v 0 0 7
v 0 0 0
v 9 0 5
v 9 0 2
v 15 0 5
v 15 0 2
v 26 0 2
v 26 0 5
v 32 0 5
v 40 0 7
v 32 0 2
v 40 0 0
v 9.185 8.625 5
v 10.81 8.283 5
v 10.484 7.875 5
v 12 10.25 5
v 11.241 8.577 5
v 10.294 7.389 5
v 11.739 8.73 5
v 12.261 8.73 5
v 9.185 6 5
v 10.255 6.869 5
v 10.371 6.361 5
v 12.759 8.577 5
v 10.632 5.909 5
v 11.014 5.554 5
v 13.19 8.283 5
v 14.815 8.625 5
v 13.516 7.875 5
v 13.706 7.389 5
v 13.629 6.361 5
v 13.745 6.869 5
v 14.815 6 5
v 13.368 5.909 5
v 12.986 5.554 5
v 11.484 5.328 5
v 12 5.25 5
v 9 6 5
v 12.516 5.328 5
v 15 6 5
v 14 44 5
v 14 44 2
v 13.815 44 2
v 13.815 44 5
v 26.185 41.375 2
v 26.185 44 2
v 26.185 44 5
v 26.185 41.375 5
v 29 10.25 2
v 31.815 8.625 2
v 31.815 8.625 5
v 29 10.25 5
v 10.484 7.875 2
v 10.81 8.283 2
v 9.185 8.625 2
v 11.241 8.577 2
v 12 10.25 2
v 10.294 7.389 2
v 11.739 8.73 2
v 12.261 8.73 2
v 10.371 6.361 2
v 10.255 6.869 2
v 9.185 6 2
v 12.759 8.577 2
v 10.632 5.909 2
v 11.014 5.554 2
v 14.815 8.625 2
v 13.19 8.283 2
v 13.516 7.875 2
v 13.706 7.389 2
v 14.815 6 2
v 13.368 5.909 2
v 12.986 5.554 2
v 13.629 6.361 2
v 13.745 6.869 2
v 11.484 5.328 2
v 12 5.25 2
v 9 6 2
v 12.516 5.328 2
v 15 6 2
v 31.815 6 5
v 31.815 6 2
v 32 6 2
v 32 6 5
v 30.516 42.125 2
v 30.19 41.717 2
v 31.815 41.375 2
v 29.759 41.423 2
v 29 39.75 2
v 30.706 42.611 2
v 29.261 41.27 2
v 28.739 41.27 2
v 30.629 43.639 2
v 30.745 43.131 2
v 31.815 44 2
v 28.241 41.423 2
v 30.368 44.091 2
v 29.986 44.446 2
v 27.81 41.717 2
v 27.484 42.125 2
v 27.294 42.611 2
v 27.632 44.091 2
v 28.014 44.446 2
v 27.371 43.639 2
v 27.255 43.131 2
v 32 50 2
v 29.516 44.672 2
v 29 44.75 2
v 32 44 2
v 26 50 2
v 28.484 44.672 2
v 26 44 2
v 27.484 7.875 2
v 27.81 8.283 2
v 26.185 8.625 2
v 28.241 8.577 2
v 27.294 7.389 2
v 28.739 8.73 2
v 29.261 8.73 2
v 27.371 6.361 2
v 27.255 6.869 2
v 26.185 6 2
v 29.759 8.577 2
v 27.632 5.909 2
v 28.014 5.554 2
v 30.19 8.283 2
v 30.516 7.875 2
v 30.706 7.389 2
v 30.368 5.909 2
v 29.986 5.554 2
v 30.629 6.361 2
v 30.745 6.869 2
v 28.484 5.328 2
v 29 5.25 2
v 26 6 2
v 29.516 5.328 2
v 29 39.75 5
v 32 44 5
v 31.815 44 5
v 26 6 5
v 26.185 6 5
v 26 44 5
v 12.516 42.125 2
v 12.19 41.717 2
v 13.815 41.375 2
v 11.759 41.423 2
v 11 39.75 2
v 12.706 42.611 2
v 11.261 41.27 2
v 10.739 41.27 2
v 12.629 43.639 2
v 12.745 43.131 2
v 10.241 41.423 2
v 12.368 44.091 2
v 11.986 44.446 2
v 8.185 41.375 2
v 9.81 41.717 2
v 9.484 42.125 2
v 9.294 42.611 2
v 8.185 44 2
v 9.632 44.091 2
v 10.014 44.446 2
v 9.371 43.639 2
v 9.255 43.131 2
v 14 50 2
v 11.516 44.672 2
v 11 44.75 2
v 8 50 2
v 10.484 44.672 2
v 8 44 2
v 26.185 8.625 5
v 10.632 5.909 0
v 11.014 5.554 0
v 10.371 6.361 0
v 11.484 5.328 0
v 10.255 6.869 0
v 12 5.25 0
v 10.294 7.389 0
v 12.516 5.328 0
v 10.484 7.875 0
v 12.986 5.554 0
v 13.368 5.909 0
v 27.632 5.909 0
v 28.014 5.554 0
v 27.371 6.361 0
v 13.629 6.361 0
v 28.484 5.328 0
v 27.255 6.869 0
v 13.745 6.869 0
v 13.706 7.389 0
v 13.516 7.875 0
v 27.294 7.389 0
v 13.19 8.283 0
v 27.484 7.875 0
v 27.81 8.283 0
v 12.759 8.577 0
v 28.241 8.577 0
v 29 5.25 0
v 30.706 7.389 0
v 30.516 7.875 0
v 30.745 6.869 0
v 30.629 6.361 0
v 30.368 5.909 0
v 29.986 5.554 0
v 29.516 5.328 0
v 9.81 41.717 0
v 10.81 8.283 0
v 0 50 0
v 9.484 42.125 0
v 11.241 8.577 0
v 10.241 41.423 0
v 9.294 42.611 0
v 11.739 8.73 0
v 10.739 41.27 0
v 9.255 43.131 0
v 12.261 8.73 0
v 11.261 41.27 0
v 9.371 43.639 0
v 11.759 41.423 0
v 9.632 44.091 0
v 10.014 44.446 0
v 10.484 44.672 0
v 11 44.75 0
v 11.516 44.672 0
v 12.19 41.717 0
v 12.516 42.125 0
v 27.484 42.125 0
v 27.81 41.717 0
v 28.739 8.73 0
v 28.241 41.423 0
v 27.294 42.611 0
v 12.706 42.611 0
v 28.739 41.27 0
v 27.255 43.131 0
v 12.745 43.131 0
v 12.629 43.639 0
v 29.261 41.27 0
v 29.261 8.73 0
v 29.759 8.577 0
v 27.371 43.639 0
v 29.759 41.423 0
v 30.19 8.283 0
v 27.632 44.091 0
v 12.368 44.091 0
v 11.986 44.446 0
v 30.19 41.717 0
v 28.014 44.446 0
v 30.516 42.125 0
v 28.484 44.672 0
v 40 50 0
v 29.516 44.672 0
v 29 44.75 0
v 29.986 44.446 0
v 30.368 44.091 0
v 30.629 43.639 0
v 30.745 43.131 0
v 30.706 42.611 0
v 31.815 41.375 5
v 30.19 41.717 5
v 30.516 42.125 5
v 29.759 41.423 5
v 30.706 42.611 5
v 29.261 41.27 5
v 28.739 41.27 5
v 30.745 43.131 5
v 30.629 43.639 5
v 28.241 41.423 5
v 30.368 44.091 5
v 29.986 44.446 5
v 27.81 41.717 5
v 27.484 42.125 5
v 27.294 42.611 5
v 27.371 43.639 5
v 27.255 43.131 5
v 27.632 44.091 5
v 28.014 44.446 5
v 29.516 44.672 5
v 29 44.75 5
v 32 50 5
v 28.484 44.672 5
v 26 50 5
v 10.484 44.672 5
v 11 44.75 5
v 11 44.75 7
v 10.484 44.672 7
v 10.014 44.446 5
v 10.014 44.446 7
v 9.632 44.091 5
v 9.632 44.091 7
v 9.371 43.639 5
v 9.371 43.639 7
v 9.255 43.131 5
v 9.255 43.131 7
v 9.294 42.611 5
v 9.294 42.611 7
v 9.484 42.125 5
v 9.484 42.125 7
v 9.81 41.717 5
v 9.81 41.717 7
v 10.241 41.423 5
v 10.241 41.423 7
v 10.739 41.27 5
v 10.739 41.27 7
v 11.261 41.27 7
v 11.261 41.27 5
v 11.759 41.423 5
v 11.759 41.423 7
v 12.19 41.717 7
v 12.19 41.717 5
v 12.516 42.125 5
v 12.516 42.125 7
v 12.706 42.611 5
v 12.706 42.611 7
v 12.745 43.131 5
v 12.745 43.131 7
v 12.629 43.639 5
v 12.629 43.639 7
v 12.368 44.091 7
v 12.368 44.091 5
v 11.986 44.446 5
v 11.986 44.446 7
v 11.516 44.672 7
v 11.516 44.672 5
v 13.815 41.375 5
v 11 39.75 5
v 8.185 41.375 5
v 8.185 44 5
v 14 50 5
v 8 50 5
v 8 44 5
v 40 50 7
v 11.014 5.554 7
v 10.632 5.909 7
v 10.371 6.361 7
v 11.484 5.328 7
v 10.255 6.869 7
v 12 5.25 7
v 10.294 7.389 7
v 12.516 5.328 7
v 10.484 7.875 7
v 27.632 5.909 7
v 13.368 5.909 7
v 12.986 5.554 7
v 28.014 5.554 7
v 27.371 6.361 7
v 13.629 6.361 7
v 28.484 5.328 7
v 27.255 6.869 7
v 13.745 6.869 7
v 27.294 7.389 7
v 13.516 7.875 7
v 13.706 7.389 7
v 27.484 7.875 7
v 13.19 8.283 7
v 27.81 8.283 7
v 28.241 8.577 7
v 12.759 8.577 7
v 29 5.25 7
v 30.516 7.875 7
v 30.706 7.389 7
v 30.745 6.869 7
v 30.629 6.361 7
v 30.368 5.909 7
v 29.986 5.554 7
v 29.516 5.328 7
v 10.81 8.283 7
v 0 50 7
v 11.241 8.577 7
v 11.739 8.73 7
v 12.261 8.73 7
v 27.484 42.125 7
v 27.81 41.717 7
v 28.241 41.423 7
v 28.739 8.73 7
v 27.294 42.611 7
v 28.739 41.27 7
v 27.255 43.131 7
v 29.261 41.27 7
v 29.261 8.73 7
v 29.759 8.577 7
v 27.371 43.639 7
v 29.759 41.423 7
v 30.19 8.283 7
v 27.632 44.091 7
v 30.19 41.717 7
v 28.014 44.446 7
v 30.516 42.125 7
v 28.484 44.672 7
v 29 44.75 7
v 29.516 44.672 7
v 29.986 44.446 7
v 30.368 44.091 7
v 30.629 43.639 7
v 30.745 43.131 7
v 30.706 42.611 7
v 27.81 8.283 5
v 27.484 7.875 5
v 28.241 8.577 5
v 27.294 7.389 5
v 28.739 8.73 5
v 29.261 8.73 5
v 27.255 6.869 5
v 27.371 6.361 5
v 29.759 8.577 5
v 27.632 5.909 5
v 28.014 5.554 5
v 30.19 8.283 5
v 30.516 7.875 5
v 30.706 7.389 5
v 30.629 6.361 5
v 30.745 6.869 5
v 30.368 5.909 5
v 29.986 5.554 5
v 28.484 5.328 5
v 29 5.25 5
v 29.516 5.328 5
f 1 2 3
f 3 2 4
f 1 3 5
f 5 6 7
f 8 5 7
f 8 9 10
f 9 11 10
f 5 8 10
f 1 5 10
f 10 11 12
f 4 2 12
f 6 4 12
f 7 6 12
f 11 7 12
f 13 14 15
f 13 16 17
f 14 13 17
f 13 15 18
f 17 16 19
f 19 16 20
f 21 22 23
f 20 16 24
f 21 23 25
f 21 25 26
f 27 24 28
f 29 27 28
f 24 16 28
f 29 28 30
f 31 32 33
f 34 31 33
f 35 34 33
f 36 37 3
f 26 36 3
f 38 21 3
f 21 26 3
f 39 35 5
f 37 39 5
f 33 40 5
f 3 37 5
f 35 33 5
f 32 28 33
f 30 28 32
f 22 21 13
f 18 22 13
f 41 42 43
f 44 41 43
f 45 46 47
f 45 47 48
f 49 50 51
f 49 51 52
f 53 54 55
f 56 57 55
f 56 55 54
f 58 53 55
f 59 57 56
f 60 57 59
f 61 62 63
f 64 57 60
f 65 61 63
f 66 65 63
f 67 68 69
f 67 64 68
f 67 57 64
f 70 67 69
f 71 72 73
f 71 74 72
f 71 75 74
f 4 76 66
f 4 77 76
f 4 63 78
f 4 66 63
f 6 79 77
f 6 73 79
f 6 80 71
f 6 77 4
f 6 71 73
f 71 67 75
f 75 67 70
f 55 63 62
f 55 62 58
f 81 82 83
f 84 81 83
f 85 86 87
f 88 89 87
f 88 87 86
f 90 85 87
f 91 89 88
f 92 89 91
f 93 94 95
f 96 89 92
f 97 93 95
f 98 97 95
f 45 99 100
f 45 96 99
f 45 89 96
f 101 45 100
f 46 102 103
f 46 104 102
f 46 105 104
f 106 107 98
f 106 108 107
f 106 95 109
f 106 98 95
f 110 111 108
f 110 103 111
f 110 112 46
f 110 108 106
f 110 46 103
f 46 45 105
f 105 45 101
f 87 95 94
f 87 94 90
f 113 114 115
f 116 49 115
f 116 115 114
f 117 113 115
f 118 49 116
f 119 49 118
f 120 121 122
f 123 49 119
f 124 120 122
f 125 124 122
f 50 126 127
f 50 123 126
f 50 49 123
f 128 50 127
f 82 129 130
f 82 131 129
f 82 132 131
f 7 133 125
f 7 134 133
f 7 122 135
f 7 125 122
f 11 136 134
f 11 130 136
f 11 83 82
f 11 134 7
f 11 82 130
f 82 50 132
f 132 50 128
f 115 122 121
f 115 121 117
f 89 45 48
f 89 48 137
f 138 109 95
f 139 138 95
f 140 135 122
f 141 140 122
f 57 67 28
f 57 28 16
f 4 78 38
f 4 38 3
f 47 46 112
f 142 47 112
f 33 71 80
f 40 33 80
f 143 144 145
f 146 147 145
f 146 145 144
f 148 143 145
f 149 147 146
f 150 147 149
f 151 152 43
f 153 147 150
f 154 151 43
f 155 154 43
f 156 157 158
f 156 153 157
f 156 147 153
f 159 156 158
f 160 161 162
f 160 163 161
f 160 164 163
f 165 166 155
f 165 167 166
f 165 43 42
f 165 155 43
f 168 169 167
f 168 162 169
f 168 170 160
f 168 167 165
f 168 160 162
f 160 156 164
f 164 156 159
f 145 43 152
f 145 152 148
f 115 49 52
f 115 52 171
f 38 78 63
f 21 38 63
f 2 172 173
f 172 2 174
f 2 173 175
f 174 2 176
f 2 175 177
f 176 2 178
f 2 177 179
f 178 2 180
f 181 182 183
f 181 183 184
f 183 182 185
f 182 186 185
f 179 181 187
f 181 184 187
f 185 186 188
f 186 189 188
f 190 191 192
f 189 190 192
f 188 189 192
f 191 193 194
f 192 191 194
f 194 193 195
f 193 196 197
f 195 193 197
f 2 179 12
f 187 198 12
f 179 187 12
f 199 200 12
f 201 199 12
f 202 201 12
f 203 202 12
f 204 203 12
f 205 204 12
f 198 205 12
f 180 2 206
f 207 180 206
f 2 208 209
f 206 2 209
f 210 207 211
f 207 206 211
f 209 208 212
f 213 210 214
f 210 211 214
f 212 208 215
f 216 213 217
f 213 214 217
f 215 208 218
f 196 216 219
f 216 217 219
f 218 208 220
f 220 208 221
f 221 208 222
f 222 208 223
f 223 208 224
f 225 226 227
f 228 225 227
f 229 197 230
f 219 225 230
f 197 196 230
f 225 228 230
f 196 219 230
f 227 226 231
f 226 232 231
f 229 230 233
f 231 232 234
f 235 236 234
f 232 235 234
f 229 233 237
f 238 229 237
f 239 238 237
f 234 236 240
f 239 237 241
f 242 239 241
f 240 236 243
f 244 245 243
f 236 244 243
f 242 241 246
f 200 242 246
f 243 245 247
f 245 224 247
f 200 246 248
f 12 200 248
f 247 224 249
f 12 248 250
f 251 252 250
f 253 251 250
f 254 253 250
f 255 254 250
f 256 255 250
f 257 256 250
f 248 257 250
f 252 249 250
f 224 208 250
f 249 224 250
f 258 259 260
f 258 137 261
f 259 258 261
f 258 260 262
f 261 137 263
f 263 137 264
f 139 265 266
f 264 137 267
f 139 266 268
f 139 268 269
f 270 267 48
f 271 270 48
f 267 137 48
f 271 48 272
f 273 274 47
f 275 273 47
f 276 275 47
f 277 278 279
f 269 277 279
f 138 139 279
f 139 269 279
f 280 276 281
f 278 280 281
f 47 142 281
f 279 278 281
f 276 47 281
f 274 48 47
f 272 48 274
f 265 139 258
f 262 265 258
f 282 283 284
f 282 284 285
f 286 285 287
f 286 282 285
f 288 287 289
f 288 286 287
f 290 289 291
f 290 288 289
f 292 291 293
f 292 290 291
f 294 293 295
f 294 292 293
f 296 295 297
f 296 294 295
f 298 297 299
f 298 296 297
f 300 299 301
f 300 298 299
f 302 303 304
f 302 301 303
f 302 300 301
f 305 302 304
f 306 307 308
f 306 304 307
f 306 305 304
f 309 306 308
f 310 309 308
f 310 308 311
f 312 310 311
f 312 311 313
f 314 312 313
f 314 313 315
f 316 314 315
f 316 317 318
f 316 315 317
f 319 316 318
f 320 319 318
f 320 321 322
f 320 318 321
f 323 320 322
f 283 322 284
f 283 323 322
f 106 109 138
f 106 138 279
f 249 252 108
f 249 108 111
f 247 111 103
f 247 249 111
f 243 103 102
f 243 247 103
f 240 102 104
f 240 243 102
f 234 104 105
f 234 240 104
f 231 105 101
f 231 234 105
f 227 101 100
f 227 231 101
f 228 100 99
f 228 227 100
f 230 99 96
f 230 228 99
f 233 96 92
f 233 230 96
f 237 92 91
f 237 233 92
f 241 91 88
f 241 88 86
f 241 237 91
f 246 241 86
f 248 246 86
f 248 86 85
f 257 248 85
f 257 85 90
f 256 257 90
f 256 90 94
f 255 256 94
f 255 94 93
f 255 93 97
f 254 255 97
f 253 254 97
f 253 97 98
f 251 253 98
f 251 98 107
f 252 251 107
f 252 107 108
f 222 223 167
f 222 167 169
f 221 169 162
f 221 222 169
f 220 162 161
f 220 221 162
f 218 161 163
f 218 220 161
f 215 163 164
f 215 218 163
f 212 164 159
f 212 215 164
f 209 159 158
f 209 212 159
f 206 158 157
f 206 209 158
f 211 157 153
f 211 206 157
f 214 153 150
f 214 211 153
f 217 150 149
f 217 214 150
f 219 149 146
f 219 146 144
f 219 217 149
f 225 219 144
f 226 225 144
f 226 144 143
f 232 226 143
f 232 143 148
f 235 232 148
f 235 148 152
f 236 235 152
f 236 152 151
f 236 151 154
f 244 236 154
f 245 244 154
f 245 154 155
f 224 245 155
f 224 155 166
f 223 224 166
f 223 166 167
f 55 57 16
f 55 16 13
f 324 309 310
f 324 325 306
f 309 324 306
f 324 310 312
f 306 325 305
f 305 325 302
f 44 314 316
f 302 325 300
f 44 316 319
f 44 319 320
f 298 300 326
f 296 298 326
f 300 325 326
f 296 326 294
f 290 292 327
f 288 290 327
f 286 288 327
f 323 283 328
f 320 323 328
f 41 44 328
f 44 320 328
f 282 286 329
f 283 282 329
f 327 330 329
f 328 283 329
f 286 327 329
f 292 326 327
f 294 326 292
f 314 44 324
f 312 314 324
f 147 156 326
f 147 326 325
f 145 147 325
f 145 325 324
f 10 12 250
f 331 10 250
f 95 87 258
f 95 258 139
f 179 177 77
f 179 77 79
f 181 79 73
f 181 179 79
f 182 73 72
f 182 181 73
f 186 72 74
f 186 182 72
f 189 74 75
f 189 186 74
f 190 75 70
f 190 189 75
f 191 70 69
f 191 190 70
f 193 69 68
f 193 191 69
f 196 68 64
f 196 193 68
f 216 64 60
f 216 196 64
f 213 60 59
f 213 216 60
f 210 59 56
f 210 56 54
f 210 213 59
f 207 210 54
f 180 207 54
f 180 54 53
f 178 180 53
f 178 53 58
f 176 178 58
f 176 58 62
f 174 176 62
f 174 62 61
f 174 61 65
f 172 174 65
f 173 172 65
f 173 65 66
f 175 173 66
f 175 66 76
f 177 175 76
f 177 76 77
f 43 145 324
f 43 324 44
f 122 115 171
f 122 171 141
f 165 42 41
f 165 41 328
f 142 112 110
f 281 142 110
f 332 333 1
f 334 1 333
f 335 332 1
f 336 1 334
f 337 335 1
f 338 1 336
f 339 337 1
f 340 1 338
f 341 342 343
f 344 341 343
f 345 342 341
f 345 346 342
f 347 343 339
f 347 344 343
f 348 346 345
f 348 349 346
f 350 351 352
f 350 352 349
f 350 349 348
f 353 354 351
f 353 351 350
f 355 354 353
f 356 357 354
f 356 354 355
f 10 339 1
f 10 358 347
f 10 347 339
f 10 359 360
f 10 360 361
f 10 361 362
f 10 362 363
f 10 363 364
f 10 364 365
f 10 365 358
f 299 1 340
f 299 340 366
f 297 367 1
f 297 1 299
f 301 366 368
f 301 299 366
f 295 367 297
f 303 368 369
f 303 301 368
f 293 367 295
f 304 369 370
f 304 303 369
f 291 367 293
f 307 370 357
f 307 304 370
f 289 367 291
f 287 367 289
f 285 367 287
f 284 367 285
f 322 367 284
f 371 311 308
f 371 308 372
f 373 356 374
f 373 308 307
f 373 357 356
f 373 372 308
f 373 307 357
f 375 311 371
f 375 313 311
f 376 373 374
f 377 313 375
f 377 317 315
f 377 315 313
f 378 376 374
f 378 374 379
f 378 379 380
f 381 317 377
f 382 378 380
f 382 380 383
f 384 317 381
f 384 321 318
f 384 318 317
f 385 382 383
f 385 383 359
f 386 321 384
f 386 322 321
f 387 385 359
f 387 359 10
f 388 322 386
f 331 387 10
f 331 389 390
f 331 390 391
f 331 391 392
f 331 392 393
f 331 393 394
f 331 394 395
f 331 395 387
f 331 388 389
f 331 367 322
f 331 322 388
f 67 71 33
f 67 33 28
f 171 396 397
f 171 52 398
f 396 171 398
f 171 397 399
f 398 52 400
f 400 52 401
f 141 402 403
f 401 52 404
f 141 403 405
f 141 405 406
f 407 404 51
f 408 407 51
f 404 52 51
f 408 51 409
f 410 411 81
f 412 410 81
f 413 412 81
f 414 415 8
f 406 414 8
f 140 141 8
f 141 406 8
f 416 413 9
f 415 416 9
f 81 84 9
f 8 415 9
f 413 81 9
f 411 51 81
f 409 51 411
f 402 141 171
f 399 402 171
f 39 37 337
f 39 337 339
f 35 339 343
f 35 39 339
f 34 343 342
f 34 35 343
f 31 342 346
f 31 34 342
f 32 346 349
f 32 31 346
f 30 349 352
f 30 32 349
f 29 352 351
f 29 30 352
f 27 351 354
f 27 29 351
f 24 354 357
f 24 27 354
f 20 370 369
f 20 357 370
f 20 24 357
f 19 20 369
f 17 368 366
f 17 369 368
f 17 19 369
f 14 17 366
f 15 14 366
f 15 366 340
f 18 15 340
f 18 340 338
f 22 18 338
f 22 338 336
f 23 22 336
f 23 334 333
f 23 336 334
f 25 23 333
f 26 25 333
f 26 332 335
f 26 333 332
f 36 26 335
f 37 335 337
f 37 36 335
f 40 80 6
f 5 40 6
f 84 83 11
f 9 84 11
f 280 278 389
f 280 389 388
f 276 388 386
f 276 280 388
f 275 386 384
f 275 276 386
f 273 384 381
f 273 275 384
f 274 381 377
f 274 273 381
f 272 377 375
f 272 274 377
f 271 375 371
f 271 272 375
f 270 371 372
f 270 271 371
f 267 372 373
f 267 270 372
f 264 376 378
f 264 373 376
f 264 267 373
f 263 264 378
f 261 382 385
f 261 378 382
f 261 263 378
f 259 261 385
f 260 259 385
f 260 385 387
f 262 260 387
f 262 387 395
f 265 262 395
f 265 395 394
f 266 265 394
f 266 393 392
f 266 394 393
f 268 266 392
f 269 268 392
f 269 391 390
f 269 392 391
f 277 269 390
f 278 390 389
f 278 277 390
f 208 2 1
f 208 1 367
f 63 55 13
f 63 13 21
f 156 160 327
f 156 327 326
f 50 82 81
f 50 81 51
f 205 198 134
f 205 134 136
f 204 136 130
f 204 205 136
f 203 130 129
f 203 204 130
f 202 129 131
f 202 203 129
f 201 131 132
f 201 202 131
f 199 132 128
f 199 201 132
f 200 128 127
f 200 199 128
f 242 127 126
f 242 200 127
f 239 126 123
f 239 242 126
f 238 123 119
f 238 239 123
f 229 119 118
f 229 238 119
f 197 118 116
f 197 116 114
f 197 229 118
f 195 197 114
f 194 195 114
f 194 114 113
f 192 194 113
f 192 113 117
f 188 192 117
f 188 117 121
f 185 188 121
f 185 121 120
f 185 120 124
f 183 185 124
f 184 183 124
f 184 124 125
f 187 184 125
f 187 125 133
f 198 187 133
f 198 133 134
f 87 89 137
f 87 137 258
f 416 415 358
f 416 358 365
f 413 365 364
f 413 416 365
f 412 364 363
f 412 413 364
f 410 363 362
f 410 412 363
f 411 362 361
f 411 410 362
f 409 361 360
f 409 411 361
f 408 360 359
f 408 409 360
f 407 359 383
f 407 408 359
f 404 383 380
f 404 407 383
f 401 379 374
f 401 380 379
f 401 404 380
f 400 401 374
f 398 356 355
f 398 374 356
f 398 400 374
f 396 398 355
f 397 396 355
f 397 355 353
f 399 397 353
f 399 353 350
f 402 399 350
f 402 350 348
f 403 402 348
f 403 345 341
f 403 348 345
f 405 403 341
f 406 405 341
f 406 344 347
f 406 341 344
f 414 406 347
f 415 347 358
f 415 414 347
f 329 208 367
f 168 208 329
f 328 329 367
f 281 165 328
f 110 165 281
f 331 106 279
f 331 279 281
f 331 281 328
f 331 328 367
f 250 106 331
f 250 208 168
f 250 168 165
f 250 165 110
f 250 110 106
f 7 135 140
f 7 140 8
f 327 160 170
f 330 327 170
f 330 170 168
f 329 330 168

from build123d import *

# Parameters (mm, degrees)
CYLINDER021_R             = 1.75
CYLINDER021_DEPTH         = 30
BOX023_W                  = 20
BOX023_H                  = 6
BOX023_DEPTH              = 3
PRISM021_DEPTH            = 3
FUSION018_PLACEMENT_ANGLE = 90
CYLINDER019_R             = 1.75
CYLINDER019_DEPTH         = 30
BOX020_W                  = 20
BOX020_H                  = 6
BOX020_DEPTH              = 3
PRISM019_DEPTH            = 3
FUSION019_PLACEMENT_ANGLE = 90
CYLINDER022_R             = 1.75
CYLINDER022_DEPTH         = 30
BOX021_W                  = 20
BOX021_H                  = 6
BOX021_DEPTH              = 3
PRISM022_DEPTH            = 3
FUSION020_PLACEMENT_ANGLE = 90
CYLINDER020_R             = 1.75
CYLINDER020_DEPTH         = 30
BOX022_W                  = 20
BOX022_H                  = 6
BOX022_DEPTH              = 3
PRISM020_DEPTH            = 3
FUSION017_PLACEMENT_ANGLE = 90
BOX019_W                  = 40
BOX019_H                  = 50
BOX019_DEPTH              = 7


with BuildPart() as cilindro021:
    # Cylinder021 → Cylinder021 (new body)
    with BuildSketch(Plane.XY.offset(-5)):
        Circle(CYLINDER021_R)
    extrude(amount=CYLINDER021_DEPTH)


with BuildPart() as cubo023:
    # Box023 → Box023 (new body)
    with BuildSketch(Plane(origin=(1, -3, 0), x_dir=(1, 0, 0), z_dir=(0, 0, 1))):
        with Locations((10, 3)):
            Rectangle(BOX023_W, BOX023_H)
    extrude(amount=BOX023_DEPTH)


with BuildPart() as fusion018:
    # Prism021 → Prism021 (new body)
    with BuildSketch(Plane.XY):
        Polygon((3.25, 0), (1.625, 2.814583), (-1.625, 2.814583), (-3.25, 0), (-1.625, -2.814583), (1.625, -2.814583), align=None)
    extrude(amount=PRISM021_DEPTH)

    # Fusion018: union Cilindro021, Cubo023
    add(cilindro021.part)
    add(cubo023.part)


with BuildPart() as fusion018_1:
    # Fusion018 placement: moved
    add(fusion018.part.moved(Location((29, 43, 2))).rotate(Axis((29, 43, 2), (0, 0, 1)), FUSION018_PLACEMENT_ANGLE))


with BuildPart() as cilindro019:
    # Cylinder019 → Cylinder019 (new body)
    with BuildSketch(Plane.XY.offset(-5)):
        Circle(CYLINDER019_R)
    extrude(amount=CYLINDER019_DEPTH)


with BuildPart() as cubo020:
    # Box020 → Box020 (new body)
    with BuildSketch(Plane(origin=(1, -3, 0), x_dir=(1, 0, 0), z_dir=(0, 0, 1))):
        with Locations((10, 3)):
            Rectangle(BOX020_W, BOX020_H)
    extrude(amount=BOX020_DEPTH)


with BuildPart() as fusion019:
    # Prism019 → Prism019 (new body)
    with BuildSketch(Plane.XY):
        Polygon((3.25, 0), (1.625, 2.814583), (-1.625, 2.814583), (-3.25, 0), (-1.625, -2.814583), (1.625, -2.814583), align=None)
    extrude(amount=PRISM019_DEPTH)

    # Fusion019: union Cilindro019, Cubo020
    add(cilindro019.part)
    add(cubo020.part)


with BuildPart() as fusion019_1:
    # Fusion019 placement: moved
    add(fusion019.part.moved(Location((29, 7, 2))).rotate(Axis((29, 7, 2), (0, 0, -1)), FUSION019_PLACEMENT_ANGLE))


with BuildPart() as cilindro022:
    # Cylinder022 → Cylinder022 (new body)
    with BuildSketch(Plane.XY.offset(-5)):
        Circle(CYLINDER022_R)
    extrude(amount=CYLINDER022_DEPTH)


with BuildPart() as cubo021:
    # Box021 → Box021 (new body)
    with BuildSketch(Plane(origin=(1, -3, 0), x_dir=(1, 0, 0), z_dir=(0, 0, 1))):
        with Locations((10, 3)):
            Rectangle(BOX021_W, BOX021_H)
    extrude(amount=BOX021_DEPTH)


with BuildPart() as fusion020:
    # Prism022 → Prism022 (new body)
    with BuildSketch(Plane.XY):
        Polygon((3.25, 0), (1.625, 2.814583), (-1.625, 2.814583), (-3.25, 0), (-1.625, -2.814583), (1.625, -2.814583), align=None)
    extrude(amount=PRISM022_DEPTH)

    # Fusion020: union Cilindro022, Cubo021
    add(cilindro022.part)
    add(cubo021.part)


with BuildPart() as fusion020_1:
    # Fusion020 placement: moved
    add(fusion020.part.moved(Location((12, 7, 2))).rotate(Axis((12, 7, 2), (0, 0, -1)), FUSION020_PLACEMENT_ANGLE))


with BuildPart() as cilindro020:
    # Cylinder020 → Cylinder020 (new body)
    with BuildSketch(Plane.XY.offset(-5)):
        Circle(CYLINDER020_R)
    extrude(amount=CYLINDER020_DEPTH)


with BuildPart() as cubo022:
    # Box022 → Box022 (new body)
    with BuildSketch(Plane(origin=(1, -3, 0), x_dir=(1, 0, 0), z_dir=(0, 0, 1))):
        with Locations((10, 3)):
            Rectangle(BOX022_W, BOX022_H)
    extrude(amount=BOX022_DEPTH)


with BuildPart() as fusion017:
    # Prism020 → Prism020 (new body)
    with BuildSketch(Plane.XY):
        Polygon((3.25, 0), (1.625, 2.814583), (-1.625, 2.814583), (-3.25, 0), (-1.625, -2.814583), (1.625, -2.814583), align=None)
    extrude(amount=PRISM020_DEPTH)

    # Fusion017: union Cilindro020, Cubo022
    add(cilindro020.part)
    add(cubo022.part)


with BuildPart() as fusion017_1:
    # Fusion017 placement: moved
    add(fusion017.part.moved(Location((11, 43, 2))).rotate(Axis((11, 43, 2), (0, 0, 1)), FUSION017_PLACEMENT_ANGLE))


with BuildPart() as cut029:
    # Box019 → Box019 (new body)
    with BuildSketch(Plane.XY):
        with Locations((20, 25)):
            Rectangle(BOX019_W, BOX019_H)
    extrude(amount=BOX019_DEPTH)

    # Cut026: cut Fusion017
    add(fusion017_1.part, mode=Mode.SUBTRACT)

    # Cut027: cut Fusion020
    add(fusion020_1.part, mode=Mode.SUBTRACT)

    # Cut028: cut Fusion019
    add(fusion019_1.part, mode=Mode.SUBTRACT)

    # Cut029: cut Fusion018
    add(fusion018_1.part, mode=Mode.SUBTRACT)


solid = cut029.part
